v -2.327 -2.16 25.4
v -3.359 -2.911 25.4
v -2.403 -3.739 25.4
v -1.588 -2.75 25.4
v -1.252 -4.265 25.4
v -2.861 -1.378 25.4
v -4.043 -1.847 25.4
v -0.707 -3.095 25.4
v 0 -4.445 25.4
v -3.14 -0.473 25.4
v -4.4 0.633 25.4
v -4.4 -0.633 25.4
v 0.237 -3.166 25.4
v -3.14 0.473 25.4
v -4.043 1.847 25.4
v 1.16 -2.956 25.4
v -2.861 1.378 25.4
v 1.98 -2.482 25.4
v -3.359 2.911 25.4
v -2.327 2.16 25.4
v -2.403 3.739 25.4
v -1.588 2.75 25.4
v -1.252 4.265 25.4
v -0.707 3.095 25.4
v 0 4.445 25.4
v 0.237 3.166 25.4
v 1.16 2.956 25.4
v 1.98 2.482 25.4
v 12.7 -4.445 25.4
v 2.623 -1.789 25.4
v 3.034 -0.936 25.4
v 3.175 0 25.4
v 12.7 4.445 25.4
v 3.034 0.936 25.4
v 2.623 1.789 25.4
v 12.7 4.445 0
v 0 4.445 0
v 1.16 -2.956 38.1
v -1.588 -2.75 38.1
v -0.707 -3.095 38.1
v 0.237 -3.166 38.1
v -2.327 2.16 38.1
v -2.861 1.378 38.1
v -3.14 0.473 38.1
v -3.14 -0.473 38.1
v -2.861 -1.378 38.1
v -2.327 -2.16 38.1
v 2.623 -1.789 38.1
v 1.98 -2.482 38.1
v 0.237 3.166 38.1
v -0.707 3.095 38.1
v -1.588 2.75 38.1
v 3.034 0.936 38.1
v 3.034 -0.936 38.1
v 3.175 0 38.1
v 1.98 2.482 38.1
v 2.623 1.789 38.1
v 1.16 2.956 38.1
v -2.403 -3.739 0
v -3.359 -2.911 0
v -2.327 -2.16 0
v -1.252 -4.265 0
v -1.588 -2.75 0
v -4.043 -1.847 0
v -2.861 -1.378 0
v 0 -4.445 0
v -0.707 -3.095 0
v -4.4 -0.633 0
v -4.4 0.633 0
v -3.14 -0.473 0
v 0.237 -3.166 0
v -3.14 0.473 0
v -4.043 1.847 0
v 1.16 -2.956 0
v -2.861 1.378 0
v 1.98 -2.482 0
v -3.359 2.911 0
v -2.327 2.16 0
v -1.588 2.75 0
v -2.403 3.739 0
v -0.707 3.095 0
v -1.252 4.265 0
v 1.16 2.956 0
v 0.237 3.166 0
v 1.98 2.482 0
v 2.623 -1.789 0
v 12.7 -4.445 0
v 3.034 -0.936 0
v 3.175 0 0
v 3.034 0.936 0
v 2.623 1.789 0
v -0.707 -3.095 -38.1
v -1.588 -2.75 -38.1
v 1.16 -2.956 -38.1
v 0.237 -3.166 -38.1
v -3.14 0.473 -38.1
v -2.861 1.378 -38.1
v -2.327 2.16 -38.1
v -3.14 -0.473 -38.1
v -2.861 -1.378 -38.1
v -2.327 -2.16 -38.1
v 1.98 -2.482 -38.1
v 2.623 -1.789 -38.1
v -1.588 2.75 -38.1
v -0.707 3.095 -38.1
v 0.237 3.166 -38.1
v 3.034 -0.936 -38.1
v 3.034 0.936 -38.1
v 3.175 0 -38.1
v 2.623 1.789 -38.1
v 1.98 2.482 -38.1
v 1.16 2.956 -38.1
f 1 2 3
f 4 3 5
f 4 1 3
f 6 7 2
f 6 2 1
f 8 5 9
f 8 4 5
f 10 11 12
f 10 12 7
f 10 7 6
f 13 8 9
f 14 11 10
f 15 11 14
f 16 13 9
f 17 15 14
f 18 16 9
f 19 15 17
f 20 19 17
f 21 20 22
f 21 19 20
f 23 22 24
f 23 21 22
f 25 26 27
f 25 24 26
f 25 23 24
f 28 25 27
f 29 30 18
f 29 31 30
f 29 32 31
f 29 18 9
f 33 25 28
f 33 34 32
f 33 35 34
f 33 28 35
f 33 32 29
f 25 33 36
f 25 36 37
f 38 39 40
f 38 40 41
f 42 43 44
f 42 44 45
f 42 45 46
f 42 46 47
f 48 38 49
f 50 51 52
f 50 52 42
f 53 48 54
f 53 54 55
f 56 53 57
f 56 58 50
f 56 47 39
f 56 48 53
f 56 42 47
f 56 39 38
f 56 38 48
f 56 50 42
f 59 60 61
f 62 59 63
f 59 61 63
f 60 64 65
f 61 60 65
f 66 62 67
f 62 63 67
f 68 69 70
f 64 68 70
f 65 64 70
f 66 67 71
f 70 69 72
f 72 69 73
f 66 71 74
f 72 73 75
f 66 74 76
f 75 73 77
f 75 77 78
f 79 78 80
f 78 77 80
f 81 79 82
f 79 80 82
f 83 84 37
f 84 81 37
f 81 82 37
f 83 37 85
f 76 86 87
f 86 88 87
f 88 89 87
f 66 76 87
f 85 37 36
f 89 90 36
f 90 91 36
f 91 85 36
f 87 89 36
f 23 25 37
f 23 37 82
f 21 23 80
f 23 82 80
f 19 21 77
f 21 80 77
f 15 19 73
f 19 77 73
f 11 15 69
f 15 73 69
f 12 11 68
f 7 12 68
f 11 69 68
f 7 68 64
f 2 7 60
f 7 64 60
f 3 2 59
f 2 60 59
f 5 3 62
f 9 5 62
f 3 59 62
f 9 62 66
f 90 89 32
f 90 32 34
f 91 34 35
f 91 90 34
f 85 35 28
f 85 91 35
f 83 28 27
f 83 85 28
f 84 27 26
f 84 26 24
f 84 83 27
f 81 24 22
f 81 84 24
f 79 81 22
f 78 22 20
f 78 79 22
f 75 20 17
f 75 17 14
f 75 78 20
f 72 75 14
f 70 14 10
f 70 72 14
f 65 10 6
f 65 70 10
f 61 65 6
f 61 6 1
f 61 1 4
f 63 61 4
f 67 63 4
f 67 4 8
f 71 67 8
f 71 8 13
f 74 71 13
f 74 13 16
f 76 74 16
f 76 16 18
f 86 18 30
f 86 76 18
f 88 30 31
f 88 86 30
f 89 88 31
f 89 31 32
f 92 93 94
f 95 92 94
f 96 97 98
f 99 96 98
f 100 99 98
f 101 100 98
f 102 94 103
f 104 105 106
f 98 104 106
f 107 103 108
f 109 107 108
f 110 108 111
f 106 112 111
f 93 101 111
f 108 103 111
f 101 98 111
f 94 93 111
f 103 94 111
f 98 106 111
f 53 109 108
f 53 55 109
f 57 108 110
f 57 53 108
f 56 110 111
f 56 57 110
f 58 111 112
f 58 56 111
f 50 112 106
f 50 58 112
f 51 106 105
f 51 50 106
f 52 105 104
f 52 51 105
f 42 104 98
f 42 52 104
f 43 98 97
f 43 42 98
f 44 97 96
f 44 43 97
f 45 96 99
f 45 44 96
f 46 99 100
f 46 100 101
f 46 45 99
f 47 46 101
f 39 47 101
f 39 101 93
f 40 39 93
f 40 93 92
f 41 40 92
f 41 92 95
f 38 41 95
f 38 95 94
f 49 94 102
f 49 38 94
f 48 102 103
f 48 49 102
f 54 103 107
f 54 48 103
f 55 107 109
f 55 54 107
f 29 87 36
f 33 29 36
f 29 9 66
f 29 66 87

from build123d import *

# Parameters (mm, degrees)
F0_R     = 3.175
F1_DEPTH = 25.4
F2_DEPTH = 38.1


with BuildPart() as f1:
    # F0 (on Top) → F1 (new body)
    with BuildSketch(Plane.XY):
        with BuildLine():
            Line((12.7, 4.445), (0, 4.445))
            ThreePointArc((0, 4.445), (-4.445, 0), (0, -4.445))
            Line((0, -4.445), (12.7, -4.445))
            Line((12.7, -4.445), (12.7, 4.445))
        make_face()
        Circle(F0_R, mode=Mode.SUBTRACT)
    extrude(amount=F1_DEPTH)


with BuildPart() as f2:
    # F0 (on Top) → F2 (new body, symmetric)
    with BuildSketch(Plane.XY):
        Circle(F0_R)
    extrude(amount=F2_DEPTH, both=True)


solid = Compound([f1.part, f2.part])
